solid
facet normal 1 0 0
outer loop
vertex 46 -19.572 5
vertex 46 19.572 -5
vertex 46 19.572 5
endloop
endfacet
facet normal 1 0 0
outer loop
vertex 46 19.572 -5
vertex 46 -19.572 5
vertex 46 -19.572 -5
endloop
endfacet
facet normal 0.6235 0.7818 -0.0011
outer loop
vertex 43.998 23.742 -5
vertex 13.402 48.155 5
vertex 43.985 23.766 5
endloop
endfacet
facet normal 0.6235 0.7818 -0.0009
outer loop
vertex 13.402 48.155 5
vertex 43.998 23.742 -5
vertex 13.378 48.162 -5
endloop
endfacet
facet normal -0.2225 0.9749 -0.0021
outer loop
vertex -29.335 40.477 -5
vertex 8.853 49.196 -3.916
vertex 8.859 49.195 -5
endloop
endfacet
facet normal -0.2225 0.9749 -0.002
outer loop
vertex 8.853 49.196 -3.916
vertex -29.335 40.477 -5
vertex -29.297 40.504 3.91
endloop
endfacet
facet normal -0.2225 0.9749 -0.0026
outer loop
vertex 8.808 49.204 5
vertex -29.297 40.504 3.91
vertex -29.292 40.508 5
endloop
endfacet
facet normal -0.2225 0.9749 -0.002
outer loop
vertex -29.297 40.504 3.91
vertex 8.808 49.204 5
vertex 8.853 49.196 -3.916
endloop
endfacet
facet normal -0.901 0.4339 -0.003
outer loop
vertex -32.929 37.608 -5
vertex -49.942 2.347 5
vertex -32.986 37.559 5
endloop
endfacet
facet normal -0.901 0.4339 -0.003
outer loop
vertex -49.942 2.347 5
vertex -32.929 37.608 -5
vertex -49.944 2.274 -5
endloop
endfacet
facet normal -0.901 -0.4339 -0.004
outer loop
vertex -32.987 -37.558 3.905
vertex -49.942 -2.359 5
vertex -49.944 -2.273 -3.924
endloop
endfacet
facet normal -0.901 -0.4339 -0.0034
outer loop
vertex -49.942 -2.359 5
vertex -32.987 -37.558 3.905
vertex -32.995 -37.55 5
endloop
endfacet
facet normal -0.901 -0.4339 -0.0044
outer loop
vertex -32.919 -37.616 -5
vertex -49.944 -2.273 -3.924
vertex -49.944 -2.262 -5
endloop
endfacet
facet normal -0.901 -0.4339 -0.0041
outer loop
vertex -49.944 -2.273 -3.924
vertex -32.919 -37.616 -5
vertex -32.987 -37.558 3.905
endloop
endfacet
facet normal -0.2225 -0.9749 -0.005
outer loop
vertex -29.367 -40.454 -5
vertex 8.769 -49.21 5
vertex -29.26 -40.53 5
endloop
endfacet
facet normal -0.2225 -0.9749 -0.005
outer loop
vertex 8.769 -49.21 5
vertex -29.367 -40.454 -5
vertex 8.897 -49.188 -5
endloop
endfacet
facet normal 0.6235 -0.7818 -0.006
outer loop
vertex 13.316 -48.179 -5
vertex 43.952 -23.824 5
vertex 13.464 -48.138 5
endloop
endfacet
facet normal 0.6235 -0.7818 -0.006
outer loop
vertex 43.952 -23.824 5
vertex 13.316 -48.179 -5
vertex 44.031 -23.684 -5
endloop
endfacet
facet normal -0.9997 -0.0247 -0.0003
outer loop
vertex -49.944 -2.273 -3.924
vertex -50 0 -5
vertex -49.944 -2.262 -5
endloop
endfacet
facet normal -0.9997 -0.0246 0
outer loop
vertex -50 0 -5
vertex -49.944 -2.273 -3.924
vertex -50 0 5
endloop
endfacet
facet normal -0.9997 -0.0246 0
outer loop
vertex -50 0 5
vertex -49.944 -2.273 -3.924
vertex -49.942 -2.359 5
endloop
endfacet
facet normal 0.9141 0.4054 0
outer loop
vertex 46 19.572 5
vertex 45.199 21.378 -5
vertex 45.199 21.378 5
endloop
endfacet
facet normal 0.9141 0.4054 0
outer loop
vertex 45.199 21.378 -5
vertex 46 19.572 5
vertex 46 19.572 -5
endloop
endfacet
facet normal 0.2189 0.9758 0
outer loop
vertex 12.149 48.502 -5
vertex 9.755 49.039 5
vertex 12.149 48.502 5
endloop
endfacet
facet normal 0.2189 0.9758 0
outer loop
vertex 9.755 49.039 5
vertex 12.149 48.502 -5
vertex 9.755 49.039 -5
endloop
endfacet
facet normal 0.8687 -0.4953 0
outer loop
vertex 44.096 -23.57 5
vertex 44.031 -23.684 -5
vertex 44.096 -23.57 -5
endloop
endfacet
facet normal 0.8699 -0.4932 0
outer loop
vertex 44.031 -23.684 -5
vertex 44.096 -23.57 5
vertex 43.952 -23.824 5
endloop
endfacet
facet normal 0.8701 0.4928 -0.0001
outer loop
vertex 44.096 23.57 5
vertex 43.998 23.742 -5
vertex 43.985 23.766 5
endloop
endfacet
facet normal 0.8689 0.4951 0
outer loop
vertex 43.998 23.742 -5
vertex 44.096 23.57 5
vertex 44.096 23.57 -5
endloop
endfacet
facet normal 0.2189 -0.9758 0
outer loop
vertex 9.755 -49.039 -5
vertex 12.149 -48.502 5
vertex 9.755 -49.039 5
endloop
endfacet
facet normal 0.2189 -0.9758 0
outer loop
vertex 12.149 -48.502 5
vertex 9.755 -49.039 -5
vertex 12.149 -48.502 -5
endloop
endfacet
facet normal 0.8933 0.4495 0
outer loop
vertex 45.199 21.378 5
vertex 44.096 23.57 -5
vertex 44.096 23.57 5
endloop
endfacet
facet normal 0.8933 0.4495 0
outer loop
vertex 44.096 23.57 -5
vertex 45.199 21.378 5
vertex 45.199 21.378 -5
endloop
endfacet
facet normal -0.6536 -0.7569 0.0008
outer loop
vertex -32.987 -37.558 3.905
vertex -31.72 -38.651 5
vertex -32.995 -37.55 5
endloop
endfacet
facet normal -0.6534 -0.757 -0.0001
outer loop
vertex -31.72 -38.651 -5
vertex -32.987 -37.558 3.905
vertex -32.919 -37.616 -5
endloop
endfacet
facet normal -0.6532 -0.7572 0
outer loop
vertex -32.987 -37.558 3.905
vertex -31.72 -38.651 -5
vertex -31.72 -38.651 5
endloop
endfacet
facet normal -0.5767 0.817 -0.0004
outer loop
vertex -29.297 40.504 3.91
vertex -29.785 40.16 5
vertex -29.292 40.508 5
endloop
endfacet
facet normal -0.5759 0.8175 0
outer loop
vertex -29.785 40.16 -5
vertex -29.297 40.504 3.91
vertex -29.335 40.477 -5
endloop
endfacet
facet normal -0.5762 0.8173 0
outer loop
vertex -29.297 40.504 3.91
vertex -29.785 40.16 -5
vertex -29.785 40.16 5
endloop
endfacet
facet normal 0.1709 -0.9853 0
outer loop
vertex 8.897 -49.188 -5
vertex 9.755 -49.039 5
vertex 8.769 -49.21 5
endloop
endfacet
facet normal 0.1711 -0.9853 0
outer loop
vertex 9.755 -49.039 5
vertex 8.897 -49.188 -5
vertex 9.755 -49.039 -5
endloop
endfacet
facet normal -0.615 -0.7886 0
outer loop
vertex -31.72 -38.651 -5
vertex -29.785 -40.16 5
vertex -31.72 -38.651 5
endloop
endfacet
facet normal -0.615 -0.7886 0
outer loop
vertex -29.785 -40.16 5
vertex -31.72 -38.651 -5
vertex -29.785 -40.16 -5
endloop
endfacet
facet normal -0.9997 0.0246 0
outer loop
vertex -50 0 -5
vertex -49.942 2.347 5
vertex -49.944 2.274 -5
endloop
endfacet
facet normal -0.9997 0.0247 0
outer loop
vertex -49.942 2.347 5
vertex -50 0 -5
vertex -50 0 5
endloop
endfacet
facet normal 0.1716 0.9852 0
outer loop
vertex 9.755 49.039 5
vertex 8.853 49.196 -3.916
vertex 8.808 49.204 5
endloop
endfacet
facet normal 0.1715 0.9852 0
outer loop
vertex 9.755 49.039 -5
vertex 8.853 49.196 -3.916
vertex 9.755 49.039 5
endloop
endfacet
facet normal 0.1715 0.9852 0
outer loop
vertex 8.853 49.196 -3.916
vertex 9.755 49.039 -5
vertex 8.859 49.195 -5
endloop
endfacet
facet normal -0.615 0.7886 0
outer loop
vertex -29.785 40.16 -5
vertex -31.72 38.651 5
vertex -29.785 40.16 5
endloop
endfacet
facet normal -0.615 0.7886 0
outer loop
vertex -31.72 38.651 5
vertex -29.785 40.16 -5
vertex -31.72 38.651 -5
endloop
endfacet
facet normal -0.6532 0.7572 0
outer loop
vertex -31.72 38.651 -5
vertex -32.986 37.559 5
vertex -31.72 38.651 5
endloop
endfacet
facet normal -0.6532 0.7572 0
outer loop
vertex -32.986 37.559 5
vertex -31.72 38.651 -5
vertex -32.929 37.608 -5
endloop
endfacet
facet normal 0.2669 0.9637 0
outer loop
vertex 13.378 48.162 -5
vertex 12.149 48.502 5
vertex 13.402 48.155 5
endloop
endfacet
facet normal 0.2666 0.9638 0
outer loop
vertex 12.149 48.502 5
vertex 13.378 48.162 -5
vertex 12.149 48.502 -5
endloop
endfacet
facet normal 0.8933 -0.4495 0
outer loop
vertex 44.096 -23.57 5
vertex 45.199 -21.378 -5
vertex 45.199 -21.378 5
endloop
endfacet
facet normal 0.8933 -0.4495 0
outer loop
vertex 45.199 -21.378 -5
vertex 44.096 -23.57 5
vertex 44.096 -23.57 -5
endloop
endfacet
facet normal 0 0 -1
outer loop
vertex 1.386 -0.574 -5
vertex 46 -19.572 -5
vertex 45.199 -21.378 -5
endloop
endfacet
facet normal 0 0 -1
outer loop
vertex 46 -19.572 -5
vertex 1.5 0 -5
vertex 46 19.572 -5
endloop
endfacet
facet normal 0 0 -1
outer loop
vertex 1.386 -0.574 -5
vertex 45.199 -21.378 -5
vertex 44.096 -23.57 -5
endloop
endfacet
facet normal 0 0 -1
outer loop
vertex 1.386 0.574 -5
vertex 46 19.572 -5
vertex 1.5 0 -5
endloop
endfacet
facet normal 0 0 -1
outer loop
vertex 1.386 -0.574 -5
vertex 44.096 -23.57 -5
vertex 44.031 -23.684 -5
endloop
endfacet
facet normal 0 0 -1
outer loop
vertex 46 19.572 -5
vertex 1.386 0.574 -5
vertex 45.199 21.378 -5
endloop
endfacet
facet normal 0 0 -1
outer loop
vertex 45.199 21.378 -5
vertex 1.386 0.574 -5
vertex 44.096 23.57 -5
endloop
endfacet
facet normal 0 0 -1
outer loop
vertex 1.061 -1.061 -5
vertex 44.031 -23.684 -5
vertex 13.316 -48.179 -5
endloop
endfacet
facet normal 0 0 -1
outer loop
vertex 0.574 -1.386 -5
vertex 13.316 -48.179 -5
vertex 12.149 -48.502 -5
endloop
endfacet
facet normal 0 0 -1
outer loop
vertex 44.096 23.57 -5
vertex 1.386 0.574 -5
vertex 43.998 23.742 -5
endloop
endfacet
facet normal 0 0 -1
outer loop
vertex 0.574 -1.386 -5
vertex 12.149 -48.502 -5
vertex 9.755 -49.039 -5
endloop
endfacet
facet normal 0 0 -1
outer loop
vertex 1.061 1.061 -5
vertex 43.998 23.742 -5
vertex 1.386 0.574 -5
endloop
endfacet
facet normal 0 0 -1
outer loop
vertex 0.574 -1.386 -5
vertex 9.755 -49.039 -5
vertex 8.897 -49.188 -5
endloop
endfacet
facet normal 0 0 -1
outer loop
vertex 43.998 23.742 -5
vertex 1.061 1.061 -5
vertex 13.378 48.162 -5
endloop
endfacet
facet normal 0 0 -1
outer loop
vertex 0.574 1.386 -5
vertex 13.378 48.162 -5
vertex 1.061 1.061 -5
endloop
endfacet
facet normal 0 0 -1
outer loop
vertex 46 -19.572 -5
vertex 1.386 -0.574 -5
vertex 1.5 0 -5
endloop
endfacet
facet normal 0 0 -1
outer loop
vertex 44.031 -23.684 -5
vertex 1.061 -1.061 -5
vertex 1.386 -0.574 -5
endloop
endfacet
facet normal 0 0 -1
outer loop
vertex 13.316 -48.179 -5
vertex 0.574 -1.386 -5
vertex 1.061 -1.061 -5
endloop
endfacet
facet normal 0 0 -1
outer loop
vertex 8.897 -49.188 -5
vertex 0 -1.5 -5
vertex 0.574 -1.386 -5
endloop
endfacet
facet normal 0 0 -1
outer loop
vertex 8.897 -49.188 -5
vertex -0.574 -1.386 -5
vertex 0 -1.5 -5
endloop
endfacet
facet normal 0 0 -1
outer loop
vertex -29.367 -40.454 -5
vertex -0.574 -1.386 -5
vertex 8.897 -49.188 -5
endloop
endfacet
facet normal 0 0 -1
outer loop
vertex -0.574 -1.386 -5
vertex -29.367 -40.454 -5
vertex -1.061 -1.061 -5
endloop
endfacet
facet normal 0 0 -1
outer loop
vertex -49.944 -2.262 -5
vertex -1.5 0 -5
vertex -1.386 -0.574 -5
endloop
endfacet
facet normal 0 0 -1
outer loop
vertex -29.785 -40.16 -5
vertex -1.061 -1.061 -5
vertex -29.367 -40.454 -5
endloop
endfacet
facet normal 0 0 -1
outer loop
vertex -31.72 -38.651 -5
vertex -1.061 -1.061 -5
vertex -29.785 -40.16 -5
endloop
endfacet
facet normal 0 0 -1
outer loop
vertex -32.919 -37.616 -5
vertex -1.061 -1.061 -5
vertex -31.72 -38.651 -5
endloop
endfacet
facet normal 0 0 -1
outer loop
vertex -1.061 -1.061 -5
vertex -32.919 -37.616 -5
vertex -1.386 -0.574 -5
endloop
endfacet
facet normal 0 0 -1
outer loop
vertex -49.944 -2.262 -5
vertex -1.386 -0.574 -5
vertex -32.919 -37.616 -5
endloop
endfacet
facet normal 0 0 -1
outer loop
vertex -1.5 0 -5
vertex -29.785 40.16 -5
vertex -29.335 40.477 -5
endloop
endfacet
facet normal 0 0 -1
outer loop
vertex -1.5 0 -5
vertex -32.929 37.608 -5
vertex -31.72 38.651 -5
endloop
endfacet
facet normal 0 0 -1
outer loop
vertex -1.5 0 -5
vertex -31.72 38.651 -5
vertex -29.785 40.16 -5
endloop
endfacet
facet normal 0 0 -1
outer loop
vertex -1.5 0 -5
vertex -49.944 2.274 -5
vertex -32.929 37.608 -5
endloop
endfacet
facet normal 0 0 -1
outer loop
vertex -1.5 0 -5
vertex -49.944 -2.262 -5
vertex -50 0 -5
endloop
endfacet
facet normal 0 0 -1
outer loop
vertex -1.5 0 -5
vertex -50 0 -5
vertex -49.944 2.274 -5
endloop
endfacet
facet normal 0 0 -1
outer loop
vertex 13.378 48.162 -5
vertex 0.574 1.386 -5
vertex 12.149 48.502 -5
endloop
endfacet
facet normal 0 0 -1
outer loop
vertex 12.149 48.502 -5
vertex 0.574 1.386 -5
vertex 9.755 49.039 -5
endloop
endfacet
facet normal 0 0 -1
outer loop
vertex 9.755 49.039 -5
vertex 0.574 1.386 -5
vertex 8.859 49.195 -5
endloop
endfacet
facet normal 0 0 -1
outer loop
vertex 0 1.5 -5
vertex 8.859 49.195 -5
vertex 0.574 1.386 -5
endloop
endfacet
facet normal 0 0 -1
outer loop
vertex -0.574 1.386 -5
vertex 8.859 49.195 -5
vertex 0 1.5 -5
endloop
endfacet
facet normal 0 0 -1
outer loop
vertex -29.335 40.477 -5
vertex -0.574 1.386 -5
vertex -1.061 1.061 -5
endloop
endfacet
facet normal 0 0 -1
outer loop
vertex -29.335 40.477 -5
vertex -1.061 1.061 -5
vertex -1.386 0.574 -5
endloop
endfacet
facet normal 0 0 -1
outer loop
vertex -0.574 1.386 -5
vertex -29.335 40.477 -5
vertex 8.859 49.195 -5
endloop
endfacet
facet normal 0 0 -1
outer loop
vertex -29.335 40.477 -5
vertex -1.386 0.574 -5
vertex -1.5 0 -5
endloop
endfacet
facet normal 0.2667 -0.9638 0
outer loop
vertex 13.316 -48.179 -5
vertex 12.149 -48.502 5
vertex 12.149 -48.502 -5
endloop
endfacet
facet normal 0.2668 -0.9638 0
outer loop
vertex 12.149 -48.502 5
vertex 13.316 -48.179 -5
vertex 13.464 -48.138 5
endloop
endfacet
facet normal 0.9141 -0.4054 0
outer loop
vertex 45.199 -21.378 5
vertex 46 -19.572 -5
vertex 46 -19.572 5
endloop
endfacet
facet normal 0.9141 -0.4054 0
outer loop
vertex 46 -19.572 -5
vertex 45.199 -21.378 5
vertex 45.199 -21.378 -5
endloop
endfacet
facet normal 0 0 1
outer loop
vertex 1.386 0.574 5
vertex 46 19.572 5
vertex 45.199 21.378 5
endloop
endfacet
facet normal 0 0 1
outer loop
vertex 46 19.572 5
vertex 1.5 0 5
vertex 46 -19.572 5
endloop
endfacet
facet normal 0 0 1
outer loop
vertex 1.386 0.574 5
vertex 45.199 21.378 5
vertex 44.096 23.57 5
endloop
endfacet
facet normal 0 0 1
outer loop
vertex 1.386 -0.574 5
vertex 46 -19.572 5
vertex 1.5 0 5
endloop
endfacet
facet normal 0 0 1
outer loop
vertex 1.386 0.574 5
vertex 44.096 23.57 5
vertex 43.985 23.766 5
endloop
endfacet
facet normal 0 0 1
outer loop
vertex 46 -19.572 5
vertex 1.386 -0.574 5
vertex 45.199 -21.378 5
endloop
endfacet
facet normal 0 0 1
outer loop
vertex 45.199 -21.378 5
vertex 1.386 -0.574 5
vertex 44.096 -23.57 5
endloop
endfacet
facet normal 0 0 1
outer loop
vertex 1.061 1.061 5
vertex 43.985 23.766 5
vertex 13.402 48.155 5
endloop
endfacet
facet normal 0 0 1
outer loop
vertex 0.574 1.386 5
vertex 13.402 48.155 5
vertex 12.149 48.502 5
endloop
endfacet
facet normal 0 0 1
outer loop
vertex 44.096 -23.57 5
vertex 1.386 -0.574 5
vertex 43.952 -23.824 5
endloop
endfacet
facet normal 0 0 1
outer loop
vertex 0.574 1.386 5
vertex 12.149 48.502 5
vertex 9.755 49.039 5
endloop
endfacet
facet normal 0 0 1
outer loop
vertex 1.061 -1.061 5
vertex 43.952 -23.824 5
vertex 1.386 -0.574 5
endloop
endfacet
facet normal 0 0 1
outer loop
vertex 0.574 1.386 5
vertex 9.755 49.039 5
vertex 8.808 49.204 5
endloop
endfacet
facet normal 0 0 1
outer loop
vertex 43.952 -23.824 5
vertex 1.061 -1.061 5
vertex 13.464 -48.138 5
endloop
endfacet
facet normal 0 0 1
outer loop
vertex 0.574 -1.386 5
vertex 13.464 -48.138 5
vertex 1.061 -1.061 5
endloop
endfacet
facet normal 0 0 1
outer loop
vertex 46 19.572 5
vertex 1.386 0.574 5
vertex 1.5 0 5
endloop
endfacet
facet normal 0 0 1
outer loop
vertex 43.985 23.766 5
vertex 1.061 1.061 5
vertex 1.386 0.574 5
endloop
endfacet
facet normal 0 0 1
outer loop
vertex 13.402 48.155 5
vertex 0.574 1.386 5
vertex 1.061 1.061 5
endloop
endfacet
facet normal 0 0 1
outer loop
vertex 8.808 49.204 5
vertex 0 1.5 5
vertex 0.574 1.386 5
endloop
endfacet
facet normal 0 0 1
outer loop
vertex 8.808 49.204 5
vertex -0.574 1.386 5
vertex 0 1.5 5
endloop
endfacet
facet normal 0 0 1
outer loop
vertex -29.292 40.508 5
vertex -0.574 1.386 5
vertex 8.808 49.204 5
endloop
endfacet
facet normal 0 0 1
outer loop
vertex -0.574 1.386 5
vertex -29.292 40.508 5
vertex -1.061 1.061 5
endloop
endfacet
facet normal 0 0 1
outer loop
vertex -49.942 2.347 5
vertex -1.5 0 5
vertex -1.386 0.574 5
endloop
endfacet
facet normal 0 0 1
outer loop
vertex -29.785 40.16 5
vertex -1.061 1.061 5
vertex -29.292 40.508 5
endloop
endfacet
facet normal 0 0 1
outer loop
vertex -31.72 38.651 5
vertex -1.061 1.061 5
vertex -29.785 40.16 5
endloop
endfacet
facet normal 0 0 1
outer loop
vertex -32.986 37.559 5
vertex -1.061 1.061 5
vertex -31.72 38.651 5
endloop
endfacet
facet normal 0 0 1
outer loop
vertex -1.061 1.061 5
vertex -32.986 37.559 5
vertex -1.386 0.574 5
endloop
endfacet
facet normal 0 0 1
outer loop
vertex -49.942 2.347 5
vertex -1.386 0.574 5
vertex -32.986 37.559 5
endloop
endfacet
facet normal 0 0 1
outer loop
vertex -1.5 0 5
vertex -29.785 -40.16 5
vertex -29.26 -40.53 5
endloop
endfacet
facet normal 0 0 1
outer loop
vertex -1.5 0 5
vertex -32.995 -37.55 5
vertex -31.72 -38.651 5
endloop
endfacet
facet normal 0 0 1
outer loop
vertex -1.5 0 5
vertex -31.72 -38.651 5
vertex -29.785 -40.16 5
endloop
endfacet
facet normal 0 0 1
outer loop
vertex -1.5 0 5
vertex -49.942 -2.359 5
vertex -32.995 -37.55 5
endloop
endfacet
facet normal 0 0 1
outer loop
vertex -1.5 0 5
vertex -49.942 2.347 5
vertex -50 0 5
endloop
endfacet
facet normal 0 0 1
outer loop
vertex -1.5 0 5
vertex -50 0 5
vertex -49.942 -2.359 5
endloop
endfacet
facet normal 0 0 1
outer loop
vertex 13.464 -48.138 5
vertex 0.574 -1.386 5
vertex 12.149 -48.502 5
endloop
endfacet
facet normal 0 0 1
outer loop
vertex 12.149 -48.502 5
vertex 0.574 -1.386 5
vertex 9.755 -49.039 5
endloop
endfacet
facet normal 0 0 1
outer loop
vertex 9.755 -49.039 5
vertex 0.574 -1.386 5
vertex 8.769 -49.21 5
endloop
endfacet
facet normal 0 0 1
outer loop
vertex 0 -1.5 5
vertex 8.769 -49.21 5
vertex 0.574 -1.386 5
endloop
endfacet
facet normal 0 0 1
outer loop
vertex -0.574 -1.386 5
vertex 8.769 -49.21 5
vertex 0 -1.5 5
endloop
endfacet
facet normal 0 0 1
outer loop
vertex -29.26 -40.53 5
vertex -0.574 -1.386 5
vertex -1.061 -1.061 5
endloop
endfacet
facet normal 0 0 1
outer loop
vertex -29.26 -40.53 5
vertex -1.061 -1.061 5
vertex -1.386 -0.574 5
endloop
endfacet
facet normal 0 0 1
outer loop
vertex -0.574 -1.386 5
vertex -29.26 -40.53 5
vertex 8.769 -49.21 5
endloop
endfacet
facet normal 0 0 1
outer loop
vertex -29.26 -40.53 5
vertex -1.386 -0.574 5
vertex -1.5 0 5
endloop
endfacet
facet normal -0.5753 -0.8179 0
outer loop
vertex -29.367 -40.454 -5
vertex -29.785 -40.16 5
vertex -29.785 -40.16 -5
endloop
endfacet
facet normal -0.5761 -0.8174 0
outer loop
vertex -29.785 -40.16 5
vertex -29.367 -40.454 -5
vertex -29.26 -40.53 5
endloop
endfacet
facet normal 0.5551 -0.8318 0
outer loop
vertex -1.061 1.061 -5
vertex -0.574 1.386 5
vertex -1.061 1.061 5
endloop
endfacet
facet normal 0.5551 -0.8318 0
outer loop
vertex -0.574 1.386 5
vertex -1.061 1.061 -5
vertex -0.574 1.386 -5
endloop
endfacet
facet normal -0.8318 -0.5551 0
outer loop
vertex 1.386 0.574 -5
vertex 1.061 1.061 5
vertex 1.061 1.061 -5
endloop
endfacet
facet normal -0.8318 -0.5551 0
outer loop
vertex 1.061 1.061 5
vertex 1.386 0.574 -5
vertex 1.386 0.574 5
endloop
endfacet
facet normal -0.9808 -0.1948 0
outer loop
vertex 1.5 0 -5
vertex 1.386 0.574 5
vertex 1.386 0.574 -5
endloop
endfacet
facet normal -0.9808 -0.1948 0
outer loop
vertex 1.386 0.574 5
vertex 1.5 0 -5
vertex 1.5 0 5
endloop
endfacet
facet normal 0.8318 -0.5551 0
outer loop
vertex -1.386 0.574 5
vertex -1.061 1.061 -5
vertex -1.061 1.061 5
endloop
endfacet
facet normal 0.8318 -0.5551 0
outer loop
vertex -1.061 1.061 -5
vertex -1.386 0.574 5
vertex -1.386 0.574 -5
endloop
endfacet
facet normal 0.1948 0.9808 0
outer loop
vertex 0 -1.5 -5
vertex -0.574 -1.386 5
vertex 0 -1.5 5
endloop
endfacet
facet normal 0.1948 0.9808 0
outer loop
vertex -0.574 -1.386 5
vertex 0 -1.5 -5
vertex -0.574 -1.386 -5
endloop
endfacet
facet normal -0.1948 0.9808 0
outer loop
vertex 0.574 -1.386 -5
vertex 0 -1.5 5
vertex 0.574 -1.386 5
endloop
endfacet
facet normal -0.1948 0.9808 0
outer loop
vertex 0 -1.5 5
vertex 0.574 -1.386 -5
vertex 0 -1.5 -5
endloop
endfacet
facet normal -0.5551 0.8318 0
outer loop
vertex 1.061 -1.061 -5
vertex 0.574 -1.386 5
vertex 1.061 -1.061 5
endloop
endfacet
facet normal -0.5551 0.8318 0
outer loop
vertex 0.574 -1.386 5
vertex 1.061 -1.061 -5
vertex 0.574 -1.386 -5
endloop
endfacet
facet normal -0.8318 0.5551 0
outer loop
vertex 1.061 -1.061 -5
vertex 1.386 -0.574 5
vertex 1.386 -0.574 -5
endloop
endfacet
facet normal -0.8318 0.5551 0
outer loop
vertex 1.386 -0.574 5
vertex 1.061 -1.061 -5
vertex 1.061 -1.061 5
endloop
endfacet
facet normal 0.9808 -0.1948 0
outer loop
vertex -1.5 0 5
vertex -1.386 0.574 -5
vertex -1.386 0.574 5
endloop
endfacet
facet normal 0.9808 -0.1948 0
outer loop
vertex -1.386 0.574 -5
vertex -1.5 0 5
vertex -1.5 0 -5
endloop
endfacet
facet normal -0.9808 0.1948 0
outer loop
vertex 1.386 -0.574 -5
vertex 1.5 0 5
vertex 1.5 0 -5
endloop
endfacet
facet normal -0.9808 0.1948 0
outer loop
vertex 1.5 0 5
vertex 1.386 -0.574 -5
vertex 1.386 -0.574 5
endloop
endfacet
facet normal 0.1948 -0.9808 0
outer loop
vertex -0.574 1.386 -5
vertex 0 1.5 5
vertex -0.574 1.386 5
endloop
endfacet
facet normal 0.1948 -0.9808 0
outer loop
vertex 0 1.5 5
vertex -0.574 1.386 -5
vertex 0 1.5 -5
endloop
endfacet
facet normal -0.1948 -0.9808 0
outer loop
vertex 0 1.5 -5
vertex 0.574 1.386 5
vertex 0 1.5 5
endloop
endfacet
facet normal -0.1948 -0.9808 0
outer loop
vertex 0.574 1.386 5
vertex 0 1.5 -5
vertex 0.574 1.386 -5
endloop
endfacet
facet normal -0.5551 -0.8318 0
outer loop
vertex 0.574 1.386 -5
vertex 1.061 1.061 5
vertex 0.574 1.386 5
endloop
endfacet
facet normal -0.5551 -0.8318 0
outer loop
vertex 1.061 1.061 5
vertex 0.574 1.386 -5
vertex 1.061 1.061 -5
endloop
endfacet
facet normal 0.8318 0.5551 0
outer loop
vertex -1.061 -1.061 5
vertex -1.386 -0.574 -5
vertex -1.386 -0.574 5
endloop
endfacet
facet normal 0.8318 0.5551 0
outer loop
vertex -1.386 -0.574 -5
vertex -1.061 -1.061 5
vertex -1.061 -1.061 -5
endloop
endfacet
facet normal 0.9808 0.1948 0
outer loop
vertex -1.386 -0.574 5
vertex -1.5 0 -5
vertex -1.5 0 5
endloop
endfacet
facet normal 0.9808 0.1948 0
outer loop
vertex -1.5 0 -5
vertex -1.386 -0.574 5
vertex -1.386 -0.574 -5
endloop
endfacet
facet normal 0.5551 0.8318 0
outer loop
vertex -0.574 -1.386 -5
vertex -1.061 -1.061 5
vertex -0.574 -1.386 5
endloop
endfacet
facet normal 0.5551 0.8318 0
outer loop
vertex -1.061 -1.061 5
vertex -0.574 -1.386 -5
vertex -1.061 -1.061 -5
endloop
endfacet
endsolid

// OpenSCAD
D = 100;
H = 10;
NB_FACES = 7;
FACE_WIDTH = 2 * D / 2 * sin((360 / NB_FACES) / 2) * 0.65;
PROJECTION_DISTANCE = 3000;
LINES_DISTANCES = 3;
MIRROR_ANGLE = asin(LINES_DISTANCES / PROJECTION_DISTANCE);


module test_1()
{
    difference() {
        cylinder(d=D, h=H, center=true, $fn=128);
        cylinder(d=3, h=H+1, center=true, $fn=16);

        for (angle=[0:360/NB_FACES:360-1]) {
            rotate([0, 0, angle]) {
                translate([D/2-7, 0, 0]) {
                    echo(NB_FACES*angle/360*MIRROR_ANGLE);
                    rotate([0, NB_FACES*angle/360*MIRROR_ANGLE, 0]) {
                        union() {
                            translate([10/2, 0, 0]) {
                               cube([10, FACE_WIDTH, 2*H], center=true);
                            }
                            translate([2/2, 0, 0]) {
                               cube([2, FACE_WIDTH+2, 2*H], center=true);
                            }
                        }
                    }
                }
            }
        }
    }
}


module test_2()
{
    difference() {
        cylinder(d=D, h=H, center=true, $fn=128);
        cylinder(d=3, h=H+1, center=true, $fn=16);

        for (angle=[0:360/NB_FACES:360-1]) {
            rotate([0, 0, angle]) {
                translate([D/2-4, 0, 0]) {
                    echo(NB_FACES*angle/360*MIRROR_ANGLE);
                    rotate([0, NB_FACES*angle/360*MIRROR_ANGLE, 0]) {
                        translate([10/2, 0, 0]) {
                           cube([10, 100, 2*H], center=true);
                        }
                    }
                }
            }
        }
    }
}


//test_1();
test_2();
